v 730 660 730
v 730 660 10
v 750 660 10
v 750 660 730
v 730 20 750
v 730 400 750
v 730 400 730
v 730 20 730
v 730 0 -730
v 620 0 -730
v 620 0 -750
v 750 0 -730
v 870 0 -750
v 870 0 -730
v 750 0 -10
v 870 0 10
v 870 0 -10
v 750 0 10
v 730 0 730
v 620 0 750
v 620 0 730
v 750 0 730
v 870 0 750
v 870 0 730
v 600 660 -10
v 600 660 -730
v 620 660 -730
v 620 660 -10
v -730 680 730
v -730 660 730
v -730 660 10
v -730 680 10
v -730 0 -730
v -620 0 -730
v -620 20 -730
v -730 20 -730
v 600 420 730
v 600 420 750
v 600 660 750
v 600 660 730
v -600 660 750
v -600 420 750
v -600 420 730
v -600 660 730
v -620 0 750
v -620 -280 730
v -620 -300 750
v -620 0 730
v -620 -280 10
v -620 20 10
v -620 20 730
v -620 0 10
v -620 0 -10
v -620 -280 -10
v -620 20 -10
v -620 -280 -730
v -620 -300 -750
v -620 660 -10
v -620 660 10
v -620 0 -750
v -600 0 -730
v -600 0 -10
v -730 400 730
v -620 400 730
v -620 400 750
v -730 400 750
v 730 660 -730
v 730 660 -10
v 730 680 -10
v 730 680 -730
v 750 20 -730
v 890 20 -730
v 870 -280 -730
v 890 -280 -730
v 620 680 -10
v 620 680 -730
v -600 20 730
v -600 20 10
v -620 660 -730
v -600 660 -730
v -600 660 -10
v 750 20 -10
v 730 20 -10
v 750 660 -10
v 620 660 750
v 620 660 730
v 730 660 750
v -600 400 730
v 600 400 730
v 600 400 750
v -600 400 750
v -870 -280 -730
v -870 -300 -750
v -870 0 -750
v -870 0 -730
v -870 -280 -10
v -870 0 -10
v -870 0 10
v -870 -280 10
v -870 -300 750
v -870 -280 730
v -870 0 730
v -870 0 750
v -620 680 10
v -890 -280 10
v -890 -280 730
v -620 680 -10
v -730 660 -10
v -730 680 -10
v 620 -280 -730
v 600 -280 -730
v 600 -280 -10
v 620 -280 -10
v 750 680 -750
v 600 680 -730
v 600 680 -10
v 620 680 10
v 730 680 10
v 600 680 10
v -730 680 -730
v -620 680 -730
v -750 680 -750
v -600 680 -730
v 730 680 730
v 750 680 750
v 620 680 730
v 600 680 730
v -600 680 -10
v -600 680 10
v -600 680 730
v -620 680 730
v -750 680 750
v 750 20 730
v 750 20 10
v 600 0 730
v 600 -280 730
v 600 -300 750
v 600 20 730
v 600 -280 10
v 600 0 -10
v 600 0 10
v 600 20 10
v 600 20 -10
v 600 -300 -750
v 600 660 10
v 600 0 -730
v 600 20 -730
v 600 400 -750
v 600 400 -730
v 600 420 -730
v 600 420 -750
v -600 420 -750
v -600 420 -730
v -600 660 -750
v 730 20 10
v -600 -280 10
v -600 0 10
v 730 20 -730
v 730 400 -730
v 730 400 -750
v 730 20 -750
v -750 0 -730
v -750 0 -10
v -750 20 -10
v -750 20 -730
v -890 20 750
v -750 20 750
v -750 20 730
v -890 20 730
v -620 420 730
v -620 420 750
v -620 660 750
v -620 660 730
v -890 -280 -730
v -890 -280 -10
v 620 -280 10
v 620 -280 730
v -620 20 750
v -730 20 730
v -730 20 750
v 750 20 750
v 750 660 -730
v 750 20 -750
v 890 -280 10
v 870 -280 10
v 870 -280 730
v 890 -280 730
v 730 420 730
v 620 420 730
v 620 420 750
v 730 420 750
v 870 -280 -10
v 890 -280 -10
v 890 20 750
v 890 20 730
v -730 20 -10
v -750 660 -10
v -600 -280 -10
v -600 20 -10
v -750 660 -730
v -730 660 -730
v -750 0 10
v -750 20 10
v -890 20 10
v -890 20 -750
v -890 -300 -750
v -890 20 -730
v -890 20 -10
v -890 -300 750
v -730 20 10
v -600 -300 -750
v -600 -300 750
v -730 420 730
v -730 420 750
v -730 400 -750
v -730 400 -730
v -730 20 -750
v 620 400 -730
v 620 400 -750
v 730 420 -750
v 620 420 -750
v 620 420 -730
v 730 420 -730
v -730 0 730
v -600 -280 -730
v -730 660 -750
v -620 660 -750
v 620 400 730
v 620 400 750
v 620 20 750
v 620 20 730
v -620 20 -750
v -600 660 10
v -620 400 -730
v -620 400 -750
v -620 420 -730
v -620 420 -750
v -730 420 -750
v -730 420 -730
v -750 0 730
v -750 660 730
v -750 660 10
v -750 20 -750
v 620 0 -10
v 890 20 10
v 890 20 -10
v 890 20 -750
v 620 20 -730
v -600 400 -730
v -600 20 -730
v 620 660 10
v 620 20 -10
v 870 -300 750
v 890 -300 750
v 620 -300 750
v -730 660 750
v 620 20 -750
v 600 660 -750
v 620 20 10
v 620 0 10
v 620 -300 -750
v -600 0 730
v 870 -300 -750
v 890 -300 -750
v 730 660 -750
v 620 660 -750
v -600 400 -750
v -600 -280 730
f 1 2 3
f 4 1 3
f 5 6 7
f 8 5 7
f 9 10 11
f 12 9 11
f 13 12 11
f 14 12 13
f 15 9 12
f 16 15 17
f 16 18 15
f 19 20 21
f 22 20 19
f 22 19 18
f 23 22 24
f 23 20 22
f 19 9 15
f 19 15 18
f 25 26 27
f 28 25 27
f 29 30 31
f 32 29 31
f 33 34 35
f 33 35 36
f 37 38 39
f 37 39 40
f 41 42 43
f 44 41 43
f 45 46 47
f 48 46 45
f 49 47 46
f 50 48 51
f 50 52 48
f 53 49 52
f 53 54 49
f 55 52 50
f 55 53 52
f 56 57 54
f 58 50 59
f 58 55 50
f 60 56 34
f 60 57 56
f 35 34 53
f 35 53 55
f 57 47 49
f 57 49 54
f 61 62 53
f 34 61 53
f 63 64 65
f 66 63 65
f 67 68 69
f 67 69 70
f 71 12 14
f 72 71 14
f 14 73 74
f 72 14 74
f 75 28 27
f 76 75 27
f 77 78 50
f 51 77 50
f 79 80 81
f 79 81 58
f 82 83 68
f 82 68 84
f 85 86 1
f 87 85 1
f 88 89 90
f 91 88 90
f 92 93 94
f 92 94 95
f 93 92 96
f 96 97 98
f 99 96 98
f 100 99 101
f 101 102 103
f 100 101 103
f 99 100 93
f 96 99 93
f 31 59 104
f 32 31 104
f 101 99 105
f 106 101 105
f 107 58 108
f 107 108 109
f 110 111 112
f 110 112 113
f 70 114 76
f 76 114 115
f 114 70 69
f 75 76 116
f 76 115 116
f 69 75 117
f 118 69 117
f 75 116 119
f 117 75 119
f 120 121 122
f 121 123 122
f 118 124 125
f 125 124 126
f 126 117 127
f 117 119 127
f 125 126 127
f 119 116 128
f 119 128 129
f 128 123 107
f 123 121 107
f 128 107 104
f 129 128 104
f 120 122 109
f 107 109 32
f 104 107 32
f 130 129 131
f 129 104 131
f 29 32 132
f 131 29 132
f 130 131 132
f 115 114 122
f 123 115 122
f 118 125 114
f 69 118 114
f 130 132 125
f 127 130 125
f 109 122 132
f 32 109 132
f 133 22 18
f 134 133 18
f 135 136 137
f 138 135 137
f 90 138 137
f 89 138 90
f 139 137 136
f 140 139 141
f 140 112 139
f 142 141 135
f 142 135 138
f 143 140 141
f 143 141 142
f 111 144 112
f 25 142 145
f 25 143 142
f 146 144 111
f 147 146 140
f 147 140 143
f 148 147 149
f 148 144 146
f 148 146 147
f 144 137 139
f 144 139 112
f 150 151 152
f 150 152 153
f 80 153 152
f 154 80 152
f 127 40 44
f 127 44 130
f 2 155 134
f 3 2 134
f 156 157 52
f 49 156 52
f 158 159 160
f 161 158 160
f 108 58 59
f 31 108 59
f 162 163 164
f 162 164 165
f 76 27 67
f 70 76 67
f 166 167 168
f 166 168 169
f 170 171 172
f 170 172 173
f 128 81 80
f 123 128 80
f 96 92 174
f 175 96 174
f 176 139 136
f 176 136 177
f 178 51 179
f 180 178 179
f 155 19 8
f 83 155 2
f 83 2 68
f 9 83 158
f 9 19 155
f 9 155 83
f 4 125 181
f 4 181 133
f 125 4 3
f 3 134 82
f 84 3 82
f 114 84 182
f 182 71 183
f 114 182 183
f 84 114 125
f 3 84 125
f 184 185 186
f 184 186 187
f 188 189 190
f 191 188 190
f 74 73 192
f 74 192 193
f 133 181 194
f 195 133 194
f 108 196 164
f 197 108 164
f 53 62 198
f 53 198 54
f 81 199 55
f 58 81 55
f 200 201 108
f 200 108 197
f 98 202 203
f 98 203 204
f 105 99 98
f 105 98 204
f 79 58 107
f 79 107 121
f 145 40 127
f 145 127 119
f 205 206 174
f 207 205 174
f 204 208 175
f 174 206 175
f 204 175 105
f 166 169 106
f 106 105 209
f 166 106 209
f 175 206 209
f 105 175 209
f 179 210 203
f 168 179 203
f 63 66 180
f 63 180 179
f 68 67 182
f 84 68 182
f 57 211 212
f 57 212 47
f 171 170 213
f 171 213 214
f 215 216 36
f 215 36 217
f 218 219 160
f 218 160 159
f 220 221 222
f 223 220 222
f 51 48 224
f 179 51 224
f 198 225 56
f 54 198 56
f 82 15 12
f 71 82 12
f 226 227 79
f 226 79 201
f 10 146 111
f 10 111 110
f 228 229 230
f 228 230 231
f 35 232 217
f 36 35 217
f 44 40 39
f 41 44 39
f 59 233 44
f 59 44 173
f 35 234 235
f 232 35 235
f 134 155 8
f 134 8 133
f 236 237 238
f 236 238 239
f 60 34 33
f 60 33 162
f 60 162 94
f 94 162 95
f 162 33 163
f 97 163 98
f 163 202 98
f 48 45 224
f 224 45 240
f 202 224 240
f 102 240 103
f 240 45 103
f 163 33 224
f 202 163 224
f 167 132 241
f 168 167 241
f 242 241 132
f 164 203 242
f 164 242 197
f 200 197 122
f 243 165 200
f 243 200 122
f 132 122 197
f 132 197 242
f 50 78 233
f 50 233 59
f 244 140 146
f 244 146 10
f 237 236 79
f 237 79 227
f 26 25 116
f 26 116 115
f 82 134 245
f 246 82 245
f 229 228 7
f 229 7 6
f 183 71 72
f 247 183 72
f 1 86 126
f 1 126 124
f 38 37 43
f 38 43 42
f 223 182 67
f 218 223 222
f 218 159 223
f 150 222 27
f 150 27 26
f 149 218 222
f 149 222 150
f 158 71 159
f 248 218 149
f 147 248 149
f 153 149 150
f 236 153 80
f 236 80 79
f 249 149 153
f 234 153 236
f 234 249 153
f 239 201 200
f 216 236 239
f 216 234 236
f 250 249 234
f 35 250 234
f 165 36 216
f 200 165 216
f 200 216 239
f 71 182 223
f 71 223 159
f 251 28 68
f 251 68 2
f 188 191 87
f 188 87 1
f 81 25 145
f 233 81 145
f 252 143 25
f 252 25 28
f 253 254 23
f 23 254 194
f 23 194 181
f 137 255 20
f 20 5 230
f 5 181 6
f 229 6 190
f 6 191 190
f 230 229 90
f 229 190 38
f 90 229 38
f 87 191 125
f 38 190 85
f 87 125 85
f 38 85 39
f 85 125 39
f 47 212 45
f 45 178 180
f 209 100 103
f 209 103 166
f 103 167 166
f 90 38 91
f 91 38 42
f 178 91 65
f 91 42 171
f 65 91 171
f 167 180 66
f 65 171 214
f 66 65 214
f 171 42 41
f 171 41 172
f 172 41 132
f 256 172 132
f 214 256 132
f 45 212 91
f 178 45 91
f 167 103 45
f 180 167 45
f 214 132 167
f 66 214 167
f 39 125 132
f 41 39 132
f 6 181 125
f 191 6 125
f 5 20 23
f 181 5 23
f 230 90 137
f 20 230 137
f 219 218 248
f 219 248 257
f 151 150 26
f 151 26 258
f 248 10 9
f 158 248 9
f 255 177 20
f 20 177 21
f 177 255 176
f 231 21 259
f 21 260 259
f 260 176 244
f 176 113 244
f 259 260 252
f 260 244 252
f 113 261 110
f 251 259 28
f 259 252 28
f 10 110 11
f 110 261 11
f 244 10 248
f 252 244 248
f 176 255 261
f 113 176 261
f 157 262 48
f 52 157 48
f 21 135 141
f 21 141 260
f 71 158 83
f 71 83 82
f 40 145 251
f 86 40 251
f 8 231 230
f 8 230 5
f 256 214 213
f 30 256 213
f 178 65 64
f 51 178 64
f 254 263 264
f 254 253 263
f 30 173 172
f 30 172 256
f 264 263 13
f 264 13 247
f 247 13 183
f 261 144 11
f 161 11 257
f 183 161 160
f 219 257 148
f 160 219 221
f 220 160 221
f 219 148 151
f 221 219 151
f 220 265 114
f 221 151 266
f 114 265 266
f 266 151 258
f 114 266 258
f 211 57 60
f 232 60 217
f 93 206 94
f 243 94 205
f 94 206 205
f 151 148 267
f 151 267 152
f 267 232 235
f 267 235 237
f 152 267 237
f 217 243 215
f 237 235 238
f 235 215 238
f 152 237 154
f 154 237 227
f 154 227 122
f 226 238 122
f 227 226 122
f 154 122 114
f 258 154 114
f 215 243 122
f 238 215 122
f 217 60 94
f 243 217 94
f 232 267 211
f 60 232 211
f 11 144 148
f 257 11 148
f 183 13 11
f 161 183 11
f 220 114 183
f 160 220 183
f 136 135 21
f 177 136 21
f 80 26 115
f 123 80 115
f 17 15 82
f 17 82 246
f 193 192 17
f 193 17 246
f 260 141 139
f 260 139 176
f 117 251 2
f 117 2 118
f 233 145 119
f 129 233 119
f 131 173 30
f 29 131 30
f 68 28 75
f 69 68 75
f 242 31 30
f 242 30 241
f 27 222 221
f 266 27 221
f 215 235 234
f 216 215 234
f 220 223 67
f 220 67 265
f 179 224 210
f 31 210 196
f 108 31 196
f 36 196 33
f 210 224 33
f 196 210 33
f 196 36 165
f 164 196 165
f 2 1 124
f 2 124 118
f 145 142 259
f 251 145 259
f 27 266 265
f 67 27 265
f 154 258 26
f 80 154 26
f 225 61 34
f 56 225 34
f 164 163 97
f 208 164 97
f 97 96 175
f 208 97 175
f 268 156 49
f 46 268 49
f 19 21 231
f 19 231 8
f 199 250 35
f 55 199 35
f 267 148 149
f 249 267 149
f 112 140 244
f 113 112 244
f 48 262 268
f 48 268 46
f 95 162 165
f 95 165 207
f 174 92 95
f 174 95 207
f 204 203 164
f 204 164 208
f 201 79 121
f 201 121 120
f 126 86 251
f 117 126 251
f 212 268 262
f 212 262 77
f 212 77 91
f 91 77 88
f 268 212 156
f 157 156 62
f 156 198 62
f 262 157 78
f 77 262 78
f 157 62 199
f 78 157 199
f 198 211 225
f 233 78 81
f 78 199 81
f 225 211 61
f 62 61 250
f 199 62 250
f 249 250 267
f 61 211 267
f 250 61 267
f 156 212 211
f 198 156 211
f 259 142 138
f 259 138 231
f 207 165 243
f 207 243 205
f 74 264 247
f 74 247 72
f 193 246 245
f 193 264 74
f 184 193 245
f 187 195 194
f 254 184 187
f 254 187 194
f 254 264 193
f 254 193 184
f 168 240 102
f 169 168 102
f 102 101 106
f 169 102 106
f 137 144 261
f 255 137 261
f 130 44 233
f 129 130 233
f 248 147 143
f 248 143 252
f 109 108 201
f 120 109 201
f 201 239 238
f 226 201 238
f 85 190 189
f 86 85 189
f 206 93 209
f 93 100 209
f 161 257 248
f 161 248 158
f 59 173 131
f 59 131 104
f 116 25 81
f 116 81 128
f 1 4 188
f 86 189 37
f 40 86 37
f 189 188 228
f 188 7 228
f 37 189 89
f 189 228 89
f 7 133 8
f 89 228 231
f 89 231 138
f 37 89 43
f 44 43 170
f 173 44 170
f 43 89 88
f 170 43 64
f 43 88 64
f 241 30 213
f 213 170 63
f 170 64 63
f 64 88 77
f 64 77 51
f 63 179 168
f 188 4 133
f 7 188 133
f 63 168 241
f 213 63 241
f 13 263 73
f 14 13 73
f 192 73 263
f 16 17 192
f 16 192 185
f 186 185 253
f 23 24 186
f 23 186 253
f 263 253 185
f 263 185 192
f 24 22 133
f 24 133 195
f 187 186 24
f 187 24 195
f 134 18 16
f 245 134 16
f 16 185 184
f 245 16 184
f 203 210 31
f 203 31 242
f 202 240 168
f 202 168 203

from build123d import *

# Parameters (mm, degrees)
SKETCH1_W                = 150
SKETCH1_H                = 1500
SKETCH1_W_2              = 110
SKETCH1_H_2              = 1460
BOSS_EXTRUDE1_DEPTH      = 20
SKETCH2_W                = 20
SKETCH2_H                = 20
BOSS_EXTRUDE2_DEPTH      = 640
SKETCH3_W                = 150
SKETCH3_H                = 1500
SKETCH3_W_2              = 110
SKETCH3_H_2              = 1460
BOSS_EXTRUDE3_DEPTH      = 20
SKETCH4_W                = 20
SKETCH4_H                = 20
BOSS_EXTRUDE4_DEPTH      = 660
SKETCH5_W                = 20
SKETCH5_H                = 20
BOSS_EXTRUDE5_DEPTH      = 600
BOSS_EXTRUDE5_DEPTH_BACK = 130
SKETCH6_W                = 140
SKETCH6_H                = 20
BOSS_EXTRUDE6_DEPTH      = 20
SKETCH7_W                = 20
SKETCH7_H                = 20
BOSS_EXTRUDE7_DEPTH      = 300
BOSS_EXTRUDE8_START      = -1480
SKETCH8_W                = 20
SKETCH8_H                = 20
BOSS_EXTRUDE8_DEPTH      = 1460


with BuildPart() as part:
    # Sketch1 → Boss-Extrude1 (new body)
    with BuildSketch(Plane(origin=(0, 0, 0), x_dir=(1, 0, 0), z_dir=(0, 1, 0))):
        with Locations((675, 0)):
            Rectangle(SKETCH1_W, SKETCH1_H)
        with Locations((675, 0)):
            Rectangle(SKETCH1_W_2, SKETCH1_H_2, mode=Mode.SUBTRACT)
    extrude(amount=BOSS_EXTRUDE1_DEPTH)

    # Sketch2 → Boss-Extrude2 (add)
    with BuildSketch(Plane(origin=(0, 20, 0), x_dir=(1, 0, 0), z_dir=(0, 1, 0))):
        with Locations((610, 740)):
            Rectangle(SKETCH2_W, SKETCH2_H)
        with Locations((740, 740)):
            Rectangle(SKETCH2_W, SKETCH2_H)
        with Locations((610, -740)):
            Rectangle(SKETCH2_W, SKETCH2_H)
        with Locations((740, -740)):
            Rectangle(SKETCH2_W, SKETCH2_H)
    extrude(amount=BOSS_EXTRUDE2_DEPTH)

    # Sketch3 → Boss-Extrude3 (add)
    with BuildSketch(Plane(origin=(0, 660, 0), x_dir=(1, 0, 0), z_dir=(0, 1, 0))):
        with Locations((675, 0)):
            Rectangle(SKETCH3_W, SKETCH3_H)
        with Locations((675, 0)):
            Rectangle(SKETCH3_W_2, SKETCH3_H_2, mode=Mode.SUBTRACT)
    extrude(amount=BOSS_EXTRUDE3_DEPTH)

    # Sketch4 → Boss-Extrude4 (add)
    with BuildSketch(Plane.XZ):
        with Locations((740, 0)):
            Rectangle(SKETCH4_W, SKETCH4_H)
        with Locations((610, 0)):
            Rectangle(SKETCH4_W, SKETCH4_H)
    extrude(amount=-BOSS_EXTRUDE4_DEPTH)

    # Sketch5 → Boss-Extrude5 (add, two sides)
    with BuildSketch(Plane.ZY.offset(-600)) as boss_extrude5_sk:
        with Locations((-740, 410)):
            Rectangle(SKETCH5_W, SKETCH5_H)
        with Locations((-740, 670)):
            Rectangle(SKETCH5_W, SKETCH5_H)
        with Locations((740, 410)):
            Rectangle(SKETCH5_W, SKETCH5_H)
        with Locations((740, 670)):
            Rectangle(SKETCH5_W, SKETCH5_H)
        with Locations((0, 670)):
            Rectangle(SKETCH5_W, SKETCH5_H)
    extrude(amount=BOSS_EXTRUDE5_DEPTH)
    extrude(boss_extrude5_sk.sketch, amount=-BOSS_EXTRUDE5_DEPTH_BACK)

    # Sketch6 → Boss-Extrude6 (add)
    with BuildSketch(Plane.XZ):
        with Locations((820, 740)):
            Rectangle(SKETCH6_W, SKETCH6_H)
        with Locations((820, 0)):
            Rectangle(SKETCH6_W, SKETCH6_H)
        with Locations((820, -740)):
            Rectangle(SKETCH6_W, SKETCH6_H)
    extrude(amount=-BOSS_EXTRUDE6_DEPTH)

    # Sketch7 → Boss-Extrude7 (add)
    with BuildSketch(Plane.XZ):
        with Locations((610, 740)):
            Rectangle(SKETCH7_W, SKETCH7_H)
        with Locations((880, 740)):
            Rectangle(SKETCH7_W, SKETCH7_H)
        with Locations((610, 0)):
            Rectangle(SKETCH7_W, SKETCH7_H)
        with Locations((610, -740)):
            Rectangle(SKETCH7_W, SKETCH7_H)
        with Locations((880, -740)):
            Rectangle(SKETCH7_W, SKETCH7_H)
        with Locations((880, 0)):
            Rectangle(SKETCH7_W, SKETCH7_H)
    extrude(amount=BOSS_EXTRUDE7_DEPTH)

    # Sketch8 → Boss-Extrude8 (add)
    with BuildSketch(Plane.XY.offset(750).offset(BOSS_EXTRUDE8_START)):
        with Locations((610, -290)):
            Rectangle(SKETCH8_W, SKETCH8_H)
        with Locations((880, -290)):
            Rectangle(SKETCH8_W, SKETCH8_H)
    extrude(amount=BOSS_EXTRUDE8_DEPTH)

    # Mirror1: part across plane


with BuildPart() as part_1:
    add(part.part)
    add(part.part.mirror(Plane(origin=(0, 0, 0), x_dir=(0, 0, 1), z_dir=(1, 0, 0))))


solid = part_1.part
